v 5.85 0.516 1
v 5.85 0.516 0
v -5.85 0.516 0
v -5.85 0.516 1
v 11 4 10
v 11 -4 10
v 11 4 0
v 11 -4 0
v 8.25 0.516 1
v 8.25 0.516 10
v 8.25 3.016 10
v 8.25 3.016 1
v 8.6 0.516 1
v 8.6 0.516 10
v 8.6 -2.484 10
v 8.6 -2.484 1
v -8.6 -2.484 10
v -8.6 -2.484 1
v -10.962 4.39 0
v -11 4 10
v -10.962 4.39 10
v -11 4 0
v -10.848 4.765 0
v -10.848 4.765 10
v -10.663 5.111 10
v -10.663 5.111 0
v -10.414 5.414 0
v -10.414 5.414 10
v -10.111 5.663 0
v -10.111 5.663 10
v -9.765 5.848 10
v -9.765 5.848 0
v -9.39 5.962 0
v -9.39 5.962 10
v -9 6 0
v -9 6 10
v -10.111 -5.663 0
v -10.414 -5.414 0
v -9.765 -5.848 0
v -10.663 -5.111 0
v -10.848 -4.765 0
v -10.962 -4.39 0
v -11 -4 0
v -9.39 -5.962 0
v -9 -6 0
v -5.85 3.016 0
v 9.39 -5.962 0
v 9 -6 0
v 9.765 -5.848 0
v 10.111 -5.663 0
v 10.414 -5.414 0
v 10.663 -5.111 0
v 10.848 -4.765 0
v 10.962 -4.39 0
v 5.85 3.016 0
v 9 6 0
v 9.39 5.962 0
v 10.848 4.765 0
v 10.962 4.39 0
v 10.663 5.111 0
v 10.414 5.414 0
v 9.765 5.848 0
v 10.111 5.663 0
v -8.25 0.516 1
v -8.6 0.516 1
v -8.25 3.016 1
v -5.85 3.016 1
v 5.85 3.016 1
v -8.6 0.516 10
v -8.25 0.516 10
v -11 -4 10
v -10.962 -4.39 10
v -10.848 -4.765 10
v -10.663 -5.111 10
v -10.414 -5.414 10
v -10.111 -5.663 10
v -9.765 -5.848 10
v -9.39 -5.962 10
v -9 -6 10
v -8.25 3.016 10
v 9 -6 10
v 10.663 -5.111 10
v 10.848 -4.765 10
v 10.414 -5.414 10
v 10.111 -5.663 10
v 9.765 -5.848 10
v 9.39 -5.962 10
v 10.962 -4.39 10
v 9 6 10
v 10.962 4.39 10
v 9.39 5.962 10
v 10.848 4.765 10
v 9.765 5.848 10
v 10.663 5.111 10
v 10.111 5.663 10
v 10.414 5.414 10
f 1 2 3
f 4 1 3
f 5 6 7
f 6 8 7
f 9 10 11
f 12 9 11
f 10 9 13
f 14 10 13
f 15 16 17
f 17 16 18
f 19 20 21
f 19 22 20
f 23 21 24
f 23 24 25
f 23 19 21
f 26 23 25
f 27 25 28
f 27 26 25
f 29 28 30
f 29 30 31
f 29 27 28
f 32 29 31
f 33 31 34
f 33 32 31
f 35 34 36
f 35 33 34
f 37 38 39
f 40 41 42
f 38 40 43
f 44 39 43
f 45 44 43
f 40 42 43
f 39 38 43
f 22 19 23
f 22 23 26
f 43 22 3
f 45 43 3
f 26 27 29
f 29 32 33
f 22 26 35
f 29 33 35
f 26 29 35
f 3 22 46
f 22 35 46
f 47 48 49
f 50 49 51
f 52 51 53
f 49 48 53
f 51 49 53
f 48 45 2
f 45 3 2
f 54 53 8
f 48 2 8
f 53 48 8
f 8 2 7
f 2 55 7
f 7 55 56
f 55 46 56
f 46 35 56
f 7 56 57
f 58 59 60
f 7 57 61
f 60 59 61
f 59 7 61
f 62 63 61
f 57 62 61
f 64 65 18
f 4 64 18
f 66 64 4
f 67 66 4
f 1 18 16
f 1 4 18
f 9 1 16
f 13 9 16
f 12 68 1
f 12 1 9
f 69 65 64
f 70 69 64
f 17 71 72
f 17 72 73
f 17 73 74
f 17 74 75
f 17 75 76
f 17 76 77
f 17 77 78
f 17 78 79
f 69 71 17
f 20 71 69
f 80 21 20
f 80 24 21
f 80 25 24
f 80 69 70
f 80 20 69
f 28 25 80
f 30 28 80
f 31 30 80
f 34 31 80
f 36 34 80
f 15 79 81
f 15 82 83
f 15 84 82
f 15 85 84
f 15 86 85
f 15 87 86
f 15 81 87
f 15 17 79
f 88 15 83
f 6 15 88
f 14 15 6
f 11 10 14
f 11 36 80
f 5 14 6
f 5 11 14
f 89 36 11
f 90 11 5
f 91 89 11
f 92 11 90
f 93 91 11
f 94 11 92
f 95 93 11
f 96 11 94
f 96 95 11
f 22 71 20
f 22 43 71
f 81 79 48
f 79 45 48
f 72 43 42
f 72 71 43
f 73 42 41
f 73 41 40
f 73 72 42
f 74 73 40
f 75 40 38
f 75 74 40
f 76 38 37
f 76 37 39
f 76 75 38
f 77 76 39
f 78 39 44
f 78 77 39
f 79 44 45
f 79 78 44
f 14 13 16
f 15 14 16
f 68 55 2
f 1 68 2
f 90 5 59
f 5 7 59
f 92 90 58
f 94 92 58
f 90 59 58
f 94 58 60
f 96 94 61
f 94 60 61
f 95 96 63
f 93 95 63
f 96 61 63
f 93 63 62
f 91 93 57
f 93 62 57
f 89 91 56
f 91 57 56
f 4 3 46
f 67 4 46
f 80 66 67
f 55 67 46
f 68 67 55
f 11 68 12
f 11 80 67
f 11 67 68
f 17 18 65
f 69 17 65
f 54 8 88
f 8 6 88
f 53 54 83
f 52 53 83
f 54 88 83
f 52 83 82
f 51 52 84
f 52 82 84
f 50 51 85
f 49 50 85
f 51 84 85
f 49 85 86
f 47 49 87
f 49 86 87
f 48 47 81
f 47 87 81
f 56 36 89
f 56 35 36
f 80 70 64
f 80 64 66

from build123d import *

# Parameters (mm, degrees)
F0_W     = 22
F0_H     = 12
F1_DEPTH = 1
F2_DEPTH = 10
F3_W     = 2.4
F3_H     = 2.5
F4_DEPTH = 9
F5_R     = 2


with BuildPart() as f1:
    # F0 (on Top) → F1 (new body)
    with BuildSketch(Plane.XY):
        Rectangle(F0_W, F0_H)
        Polygon((-5.85, 3.015924), (0, 3.015924), (5.85, 3.015924), (5.85, 0.515924), (8.6, 0.515924), (8.6, -2.484076), (0, -2.484076), (-8.6, -2.484076), (-8.6, 0.515924), (-5.85, 0.515924), align=None, mode=Mode.SUBTRACT)
        Polygon((8.6, 0.515924), (5.85, 0.515924), (-5.85, 0.515924), (-8.6, 0.515924), (-8.6, -2.484076), (0, -2.484076), (8.6, -2.484076), align=None)
    extrude(amount=F1_DEPTH)

    # F0 (on Top) → F2 (join)
    with BuildSketch(Plane.XY):
        Rectangle(F0_W, F0_H)
        Polygon((-5.85, 3.015924), (0, 3.015924), (5.85, 3.015924), (5.85, 0.515924), (8.6, 0.515924), (8.6, -2.484076), (0, -2.484076), (-8.6, -2.484076), (-8.6, 0.515924), (-5.85, 0.515924), align=None, mode=Mode.SUBTRACT)
    extrude(amount=F2_DEPTH)

    # F3 (on face) → F4 (cut, through all)
    with BuildSketch(Plane.XY.offset(10)):
        with Locations((-7.05, 1.765924)):
            Rectangle(F3_W, F3_H)
        with Locations((7.05, 1.765924)):
            Rectangle(F3_W, F3_H)
    extrude(amount=-F4_DEPTH, mode=Mode.SUBTRACT)

    # F5
    f5_edges = [f1.edges().sort_by_distance(p)[0] for p in [
        (-11, -6, 5),
        (11, -6, 5),
        (-11, 6, 5),
        (11, 6, 5),
    ]]
    fillet(f5_edges, radius=F5_R)


solid = f1.part
